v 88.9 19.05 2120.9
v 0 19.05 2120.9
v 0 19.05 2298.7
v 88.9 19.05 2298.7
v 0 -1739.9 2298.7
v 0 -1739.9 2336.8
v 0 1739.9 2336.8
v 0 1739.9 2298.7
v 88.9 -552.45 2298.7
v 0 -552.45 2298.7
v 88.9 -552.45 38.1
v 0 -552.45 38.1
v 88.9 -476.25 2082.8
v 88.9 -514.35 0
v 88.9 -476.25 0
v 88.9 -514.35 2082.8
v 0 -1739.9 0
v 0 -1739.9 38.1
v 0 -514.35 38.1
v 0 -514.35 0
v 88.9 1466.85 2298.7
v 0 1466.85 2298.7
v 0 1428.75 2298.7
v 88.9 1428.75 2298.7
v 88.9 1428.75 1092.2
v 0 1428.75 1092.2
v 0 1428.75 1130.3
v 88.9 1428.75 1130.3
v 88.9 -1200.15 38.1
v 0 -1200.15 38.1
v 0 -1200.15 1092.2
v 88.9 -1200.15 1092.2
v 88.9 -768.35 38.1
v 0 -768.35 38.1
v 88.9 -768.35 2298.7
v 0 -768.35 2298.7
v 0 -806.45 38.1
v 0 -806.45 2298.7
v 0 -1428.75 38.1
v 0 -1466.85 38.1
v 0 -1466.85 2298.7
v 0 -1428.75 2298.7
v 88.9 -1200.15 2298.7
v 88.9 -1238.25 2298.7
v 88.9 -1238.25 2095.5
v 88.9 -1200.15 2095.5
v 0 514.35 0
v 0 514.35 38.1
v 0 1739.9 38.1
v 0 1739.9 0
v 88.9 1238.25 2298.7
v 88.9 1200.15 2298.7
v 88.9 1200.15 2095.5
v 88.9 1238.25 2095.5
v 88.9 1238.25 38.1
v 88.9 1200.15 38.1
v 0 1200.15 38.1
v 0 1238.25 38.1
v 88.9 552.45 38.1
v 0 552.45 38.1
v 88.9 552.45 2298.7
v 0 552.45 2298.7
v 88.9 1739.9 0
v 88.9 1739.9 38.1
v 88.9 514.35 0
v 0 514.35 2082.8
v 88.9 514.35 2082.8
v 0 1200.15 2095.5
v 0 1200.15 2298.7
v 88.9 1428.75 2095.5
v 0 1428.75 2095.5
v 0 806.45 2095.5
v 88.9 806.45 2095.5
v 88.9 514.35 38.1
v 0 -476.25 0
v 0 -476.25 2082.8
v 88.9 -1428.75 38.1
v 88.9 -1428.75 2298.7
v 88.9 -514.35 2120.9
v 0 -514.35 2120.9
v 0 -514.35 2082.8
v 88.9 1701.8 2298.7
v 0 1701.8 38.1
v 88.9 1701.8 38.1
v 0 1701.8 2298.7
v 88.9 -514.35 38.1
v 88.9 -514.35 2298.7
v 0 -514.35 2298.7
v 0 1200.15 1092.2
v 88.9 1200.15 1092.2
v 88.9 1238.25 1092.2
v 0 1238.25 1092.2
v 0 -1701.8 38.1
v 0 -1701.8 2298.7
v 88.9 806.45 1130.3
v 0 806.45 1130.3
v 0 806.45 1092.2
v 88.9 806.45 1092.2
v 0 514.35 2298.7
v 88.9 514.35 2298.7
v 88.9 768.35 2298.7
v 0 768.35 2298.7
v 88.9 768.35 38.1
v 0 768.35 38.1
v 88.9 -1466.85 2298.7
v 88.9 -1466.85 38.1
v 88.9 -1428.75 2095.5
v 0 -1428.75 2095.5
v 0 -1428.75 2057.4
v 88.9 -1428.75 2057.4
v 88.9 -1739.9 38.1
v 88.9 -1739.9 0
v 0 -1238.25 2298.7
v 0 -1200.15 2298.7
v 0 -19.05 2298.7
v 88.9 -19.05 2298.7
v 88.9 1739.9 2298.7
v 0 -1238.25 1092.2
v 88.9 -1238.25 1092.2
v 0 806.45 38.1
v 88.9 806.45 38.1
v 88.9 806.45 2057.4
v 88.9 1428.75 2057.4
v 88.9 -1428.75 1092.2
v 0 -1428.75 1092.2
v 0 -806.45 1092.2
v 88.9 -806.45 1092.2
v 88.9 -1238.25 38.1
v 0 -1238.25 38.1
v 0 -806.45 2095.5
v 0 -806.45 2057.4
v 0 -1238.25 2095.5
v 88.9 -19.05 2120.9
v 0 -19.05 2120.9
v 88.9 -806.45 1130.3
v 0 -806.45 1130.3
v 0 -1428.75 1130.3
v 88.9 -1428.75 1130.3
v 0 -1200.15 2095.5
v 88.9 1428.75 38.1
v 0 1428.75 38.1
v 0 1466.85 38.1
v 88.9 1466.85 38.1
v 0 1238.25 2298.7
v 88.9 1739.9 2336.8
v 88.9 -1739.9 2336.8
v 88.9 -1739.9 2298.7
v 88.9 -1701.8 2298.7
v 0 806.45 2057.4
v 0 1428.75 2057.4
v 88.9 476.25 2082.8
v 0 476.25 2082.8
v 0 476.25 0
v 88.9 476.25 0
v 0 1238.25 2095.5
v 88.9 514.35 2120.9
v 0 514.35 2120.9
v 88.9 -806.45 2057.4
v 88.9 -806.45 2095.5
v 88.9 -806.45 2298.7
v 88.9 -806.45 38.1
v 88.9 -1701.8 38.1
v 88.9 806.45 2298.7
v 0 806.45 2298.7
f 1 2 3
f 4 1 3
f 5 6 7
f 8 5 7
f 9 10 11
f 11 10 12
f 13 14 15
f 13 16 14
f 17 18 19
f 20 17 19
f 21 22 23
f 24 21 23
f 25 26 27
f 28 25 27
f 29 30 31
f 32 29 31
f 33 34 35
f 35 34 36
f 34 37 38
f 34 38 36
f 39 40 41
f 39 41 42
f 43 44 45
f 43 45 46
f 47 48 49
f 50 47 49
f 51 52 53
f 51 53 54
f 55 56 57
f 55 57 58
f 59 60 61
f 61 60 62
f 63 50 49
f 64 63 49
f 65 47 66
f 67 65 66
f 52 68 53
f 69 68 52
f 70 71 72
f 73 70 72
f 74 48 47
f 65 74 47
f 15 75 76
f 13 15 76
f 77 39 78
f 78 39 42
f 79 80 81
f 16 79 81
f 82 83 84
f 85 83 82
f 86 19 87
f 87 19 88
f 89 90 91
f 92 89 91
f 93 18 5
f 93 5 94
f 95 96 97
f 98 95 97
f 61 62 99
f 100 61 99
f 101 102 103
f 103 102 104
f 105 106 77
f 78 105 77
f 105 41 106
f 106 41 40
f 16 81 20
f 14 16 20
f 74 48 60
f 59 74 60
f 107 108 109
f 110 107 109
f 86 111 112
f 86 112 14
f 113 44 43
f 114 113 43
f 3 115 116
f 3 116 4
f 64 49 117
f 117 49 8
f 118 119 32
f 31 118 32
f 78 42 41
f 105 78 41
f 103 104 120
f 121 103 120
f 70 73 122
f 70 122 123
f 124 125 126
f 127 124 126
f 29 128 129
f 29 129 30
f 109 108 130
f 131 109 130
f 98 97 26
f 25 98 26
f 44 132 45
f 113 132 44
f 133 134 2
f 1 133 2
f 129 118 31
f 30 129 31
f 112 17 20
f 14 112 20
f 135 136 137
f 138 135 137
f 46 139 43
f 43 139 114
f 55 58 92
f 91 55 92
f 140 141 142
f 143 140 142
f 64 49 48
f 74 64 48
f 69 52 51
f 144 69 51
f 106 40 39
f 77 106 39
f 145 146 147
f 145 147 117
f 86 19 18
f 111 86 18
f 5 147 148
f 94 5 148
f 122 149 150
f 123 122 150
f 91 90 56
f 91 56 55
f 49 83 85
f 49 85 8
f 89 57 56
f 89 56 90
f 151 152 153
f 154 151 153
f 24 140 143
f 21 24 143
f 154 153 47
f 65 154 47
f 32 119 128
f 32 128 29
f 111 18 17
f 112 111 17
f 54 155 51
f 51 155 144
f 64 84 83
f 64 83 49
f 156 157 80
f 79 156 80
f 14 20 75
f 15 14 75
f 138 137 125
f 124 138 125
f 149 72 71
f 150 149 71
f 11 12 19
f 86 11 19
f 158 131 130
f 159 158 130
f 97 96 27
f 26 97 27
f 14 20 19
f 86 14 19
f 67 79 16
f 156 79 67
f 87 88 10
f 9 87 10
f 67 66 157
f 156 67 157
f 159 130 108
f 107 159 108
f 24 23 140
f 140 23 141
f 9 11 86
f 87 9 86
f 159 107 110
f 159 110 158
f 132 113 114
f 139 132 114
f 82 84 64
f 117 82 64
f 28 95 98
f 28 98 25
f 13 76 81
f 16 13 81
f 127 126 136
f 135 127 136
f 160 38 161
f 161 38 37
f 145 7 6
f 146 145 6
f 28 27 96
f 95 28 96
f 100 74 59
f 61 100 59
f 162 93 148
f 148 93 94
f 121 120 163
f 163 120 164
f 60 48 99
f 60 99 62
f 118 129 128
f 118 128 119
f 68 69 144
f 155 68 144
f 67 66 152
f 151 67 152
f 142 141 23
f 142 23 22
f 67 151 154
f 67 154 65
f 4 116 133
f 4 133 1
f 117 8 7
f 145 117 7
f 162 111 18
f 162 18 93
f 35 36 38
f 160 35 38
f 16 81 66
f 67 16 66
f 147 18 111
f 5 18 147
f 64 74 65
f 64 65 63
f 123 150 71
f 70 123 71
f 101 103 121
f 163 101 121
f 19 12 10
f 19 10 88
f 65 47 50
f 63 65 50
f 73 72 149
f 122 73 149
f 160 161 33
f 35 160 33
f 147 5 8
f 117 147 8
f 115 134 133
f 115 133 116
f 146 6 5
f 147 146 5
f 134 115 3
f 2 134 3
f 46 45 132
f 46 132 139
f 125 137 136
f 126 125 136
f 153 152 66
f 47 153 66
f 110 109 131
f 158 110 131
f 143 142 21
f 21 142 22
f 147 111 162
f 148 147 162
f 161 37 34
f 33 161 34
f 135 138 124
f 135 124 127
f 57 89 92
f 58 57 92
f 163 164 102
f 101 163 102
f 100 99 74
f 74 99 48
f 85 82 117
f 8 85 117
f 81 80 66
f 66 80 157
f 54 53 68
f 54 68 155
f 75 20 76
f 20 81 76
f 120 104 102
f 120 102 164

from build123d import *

# Parameters (mm, degrees)
F0_W     = 38.1
F0_H     = 2260.6
F0_H_2   = 1054.1
F0_H_3   = 203.2
F0_H_4   = 177.8
F1_DEPTH = 88.9
F2_DEPTH = 88.9
F3_DEPTH = 88.9


with BuildPart() as f1:
    # F0 (on Right) → F1 (new body)
    with BuildSketch(Plane.YZ):
        with Locations((-1720.85, 1168.4)):
            Rectangle(F0_W, F0_H)
        Polygon((-1466.85, 2298.7), (-1466.85, 38.1), (-1428.75, 38.1), (-1428.75, 1092.2), (-1428.75, 1130.3), (-1428.75, 2057.4), (-1428.75, 2095.5), (-1428.75, 2298.7), align=None)
        Polygon((-806.45, 2057.4), (-806.45, 1130.3), (-806.45, 1092.2), (-806.45, 38.1), (-768.35, 38.1), (-768.35, 2298.7), (-806.45, 2298.7), (-806.45, 2095.5), align=None)
        Polygon((-552.45, 38.1), (-514.35, 38.1), (-514.35, 2082.8), (-514.35, 2120.9), (-514.35, 2298.7), (-552.45, 2298.7), align=None)
        Polygon((514.35, 2120.9), (514.35, 2082.8), (514.35, 38.1), (552.45, 38.1), (552.45, 2298.7), (514.35, 2298.7), align=None)
        Polygon((768.35, 2298.7), (768.35, 38.1), (806.45, 38.1), (806.45, 1092.2), (806.45, 1130.3), (806.45, 2057.4), (806.45, 2095.5), (806.45, 2298.7), align=None)
        Polygon((1466.85, 38.1), (1466.85, 2298.7), (1428.75, 2298.7), (1428.75, 2095.5), (1428.75, 2057.4), (1428.75, 1130.3), (1428.75, 1092.2), (1428.75, 38.1), align=None)
        with Locations((1720.85, 1168.4)):
            Rectangle(F0_W, F0_H)
        with Locations((-1219.2, 565.15)):
            Rectangle(F0_W, F0_H_2)
        with Locations((-1219.2, 2197.1)):
            Rectangle(F0_W, F0_H_3)
        with Locations((0, 2209.8)):
            Rectangle(F0_W, F0_H_4)
        with Locations((1219.2, 2197.1)):
            Rectangle(F0_W, F0_H_3)
        with Locations((1219.2, 565.15)):
            Rectangle(F0_W, F0_H_2)
    extrude(amount=F1_DEPTH)


with BuildPart() as f2:
    # F0 (on Right) → F2 (new body)
    with BuildSketch(Plane.YZ):
        Polygon((-1238.25, 2095.5), (-1428.75, 2095.5), (-1428.75, 2057.4), (-806.45, 2057.4), (-806.45, 2095.5), (-1200.15, 2095.5), align=None)
        Polygon((-1701.8, 2298.7), (-1466.85, 2298.7), (-1428.75, 2298.7), (-1238.25, 2298.7), (-1200.15, 2298.7), (-806.45, 2298.7), (-768.35, 2298.7), (-552.45, 2298.7), (-514.35, 2298.7), (-19.05, 2298.7), (19.05, 2298.7), (514.35, 2298.7), (552.45, 2298.7), (768.35, 2298.7), (806.45, 2298.7), (1200.15, 2298.7), (1238.25, 2298.7), (1428.75, 2298.7), (1466.85, 2298.7), (1701.8, 2298.7), (1739.9, 2298.7), (1739.9, 2336.8), (-1739.9, 2336.8), (-1739.9, 2298.7), align=None)
        Polygon((-514.35, 2120.9), (-514.35, 2082.8), (-476.25, 2082.8), (476.25, 2082.8), (514.35, 2082.8), (514.35, 2120.9), (19.05, 2120.9), (-19.05, 2120.9), align=None)
        Polygon((1428.75, 2057.4), (1428.75, 2095.5), (1238.25, 2095.5), (1200.15, 2095.5), (806.45, 2095.5), (806.45, 2057.4), align=None)
        Polygon((-1428.75, 1130.3), (-1428.75, 1092.2), (-1238.25, 1092.2), (-1200.15, 1092.2), (-806.45, 1092.2), (-806.45, 1130.3), align=None)
        Polygon((-1428.75, 38.1), (-1466.85, 38.1), (-1701.8, 38.1), (-1739.9, 38.1), (-1739.9, 0), (-514.35, 0), (-514.35, 38.1), (-552.45, 38.1), (-768.35, 38.1), (-806.45, 38.1), (-1200.15, 38.1), (-1238.25, 38.1), align=None)
        Polygon((1739.9, 0), (1739.9, 38.1), (1701.8, 38.1), (1466.85, 38.1), (1428.75, 38.1), (1238.25, 38.1), (1200.15, 38.1), (806.45, 38.1), (768.35, 38.1), (552.45, 38.1), (514.35, 38.1), (514.35, 0), align=None)
        Polygon((1238.25, 1092.2), (1428.75, 1092.2), (1428.75, 1130.3), (806.45, 1130.3), (806.45, 1092.2), (1200.15, 1092.2), align=None)
    extrude(amount=F2_DEPTH)


with BuildPart() as f3:
    # F0 (on Right) → F3 (new body)
    with BuildSketch(Plane.YZ):
        Polygon((-514.35, 38.1), (-514.35, 0), (-476.25, 0), (-476.25, 2082.8), (-514.35, 2082.8), align=None)
        Polygon((514.35, 2082.8), (476.25, 2082.8), (476.25, 0), (514.35, 0), (514.35, 38.1), align=None)
    extrude(amount=F3_DEPTH)


solid = Compound([f1.part, f2.part, f3.part])
